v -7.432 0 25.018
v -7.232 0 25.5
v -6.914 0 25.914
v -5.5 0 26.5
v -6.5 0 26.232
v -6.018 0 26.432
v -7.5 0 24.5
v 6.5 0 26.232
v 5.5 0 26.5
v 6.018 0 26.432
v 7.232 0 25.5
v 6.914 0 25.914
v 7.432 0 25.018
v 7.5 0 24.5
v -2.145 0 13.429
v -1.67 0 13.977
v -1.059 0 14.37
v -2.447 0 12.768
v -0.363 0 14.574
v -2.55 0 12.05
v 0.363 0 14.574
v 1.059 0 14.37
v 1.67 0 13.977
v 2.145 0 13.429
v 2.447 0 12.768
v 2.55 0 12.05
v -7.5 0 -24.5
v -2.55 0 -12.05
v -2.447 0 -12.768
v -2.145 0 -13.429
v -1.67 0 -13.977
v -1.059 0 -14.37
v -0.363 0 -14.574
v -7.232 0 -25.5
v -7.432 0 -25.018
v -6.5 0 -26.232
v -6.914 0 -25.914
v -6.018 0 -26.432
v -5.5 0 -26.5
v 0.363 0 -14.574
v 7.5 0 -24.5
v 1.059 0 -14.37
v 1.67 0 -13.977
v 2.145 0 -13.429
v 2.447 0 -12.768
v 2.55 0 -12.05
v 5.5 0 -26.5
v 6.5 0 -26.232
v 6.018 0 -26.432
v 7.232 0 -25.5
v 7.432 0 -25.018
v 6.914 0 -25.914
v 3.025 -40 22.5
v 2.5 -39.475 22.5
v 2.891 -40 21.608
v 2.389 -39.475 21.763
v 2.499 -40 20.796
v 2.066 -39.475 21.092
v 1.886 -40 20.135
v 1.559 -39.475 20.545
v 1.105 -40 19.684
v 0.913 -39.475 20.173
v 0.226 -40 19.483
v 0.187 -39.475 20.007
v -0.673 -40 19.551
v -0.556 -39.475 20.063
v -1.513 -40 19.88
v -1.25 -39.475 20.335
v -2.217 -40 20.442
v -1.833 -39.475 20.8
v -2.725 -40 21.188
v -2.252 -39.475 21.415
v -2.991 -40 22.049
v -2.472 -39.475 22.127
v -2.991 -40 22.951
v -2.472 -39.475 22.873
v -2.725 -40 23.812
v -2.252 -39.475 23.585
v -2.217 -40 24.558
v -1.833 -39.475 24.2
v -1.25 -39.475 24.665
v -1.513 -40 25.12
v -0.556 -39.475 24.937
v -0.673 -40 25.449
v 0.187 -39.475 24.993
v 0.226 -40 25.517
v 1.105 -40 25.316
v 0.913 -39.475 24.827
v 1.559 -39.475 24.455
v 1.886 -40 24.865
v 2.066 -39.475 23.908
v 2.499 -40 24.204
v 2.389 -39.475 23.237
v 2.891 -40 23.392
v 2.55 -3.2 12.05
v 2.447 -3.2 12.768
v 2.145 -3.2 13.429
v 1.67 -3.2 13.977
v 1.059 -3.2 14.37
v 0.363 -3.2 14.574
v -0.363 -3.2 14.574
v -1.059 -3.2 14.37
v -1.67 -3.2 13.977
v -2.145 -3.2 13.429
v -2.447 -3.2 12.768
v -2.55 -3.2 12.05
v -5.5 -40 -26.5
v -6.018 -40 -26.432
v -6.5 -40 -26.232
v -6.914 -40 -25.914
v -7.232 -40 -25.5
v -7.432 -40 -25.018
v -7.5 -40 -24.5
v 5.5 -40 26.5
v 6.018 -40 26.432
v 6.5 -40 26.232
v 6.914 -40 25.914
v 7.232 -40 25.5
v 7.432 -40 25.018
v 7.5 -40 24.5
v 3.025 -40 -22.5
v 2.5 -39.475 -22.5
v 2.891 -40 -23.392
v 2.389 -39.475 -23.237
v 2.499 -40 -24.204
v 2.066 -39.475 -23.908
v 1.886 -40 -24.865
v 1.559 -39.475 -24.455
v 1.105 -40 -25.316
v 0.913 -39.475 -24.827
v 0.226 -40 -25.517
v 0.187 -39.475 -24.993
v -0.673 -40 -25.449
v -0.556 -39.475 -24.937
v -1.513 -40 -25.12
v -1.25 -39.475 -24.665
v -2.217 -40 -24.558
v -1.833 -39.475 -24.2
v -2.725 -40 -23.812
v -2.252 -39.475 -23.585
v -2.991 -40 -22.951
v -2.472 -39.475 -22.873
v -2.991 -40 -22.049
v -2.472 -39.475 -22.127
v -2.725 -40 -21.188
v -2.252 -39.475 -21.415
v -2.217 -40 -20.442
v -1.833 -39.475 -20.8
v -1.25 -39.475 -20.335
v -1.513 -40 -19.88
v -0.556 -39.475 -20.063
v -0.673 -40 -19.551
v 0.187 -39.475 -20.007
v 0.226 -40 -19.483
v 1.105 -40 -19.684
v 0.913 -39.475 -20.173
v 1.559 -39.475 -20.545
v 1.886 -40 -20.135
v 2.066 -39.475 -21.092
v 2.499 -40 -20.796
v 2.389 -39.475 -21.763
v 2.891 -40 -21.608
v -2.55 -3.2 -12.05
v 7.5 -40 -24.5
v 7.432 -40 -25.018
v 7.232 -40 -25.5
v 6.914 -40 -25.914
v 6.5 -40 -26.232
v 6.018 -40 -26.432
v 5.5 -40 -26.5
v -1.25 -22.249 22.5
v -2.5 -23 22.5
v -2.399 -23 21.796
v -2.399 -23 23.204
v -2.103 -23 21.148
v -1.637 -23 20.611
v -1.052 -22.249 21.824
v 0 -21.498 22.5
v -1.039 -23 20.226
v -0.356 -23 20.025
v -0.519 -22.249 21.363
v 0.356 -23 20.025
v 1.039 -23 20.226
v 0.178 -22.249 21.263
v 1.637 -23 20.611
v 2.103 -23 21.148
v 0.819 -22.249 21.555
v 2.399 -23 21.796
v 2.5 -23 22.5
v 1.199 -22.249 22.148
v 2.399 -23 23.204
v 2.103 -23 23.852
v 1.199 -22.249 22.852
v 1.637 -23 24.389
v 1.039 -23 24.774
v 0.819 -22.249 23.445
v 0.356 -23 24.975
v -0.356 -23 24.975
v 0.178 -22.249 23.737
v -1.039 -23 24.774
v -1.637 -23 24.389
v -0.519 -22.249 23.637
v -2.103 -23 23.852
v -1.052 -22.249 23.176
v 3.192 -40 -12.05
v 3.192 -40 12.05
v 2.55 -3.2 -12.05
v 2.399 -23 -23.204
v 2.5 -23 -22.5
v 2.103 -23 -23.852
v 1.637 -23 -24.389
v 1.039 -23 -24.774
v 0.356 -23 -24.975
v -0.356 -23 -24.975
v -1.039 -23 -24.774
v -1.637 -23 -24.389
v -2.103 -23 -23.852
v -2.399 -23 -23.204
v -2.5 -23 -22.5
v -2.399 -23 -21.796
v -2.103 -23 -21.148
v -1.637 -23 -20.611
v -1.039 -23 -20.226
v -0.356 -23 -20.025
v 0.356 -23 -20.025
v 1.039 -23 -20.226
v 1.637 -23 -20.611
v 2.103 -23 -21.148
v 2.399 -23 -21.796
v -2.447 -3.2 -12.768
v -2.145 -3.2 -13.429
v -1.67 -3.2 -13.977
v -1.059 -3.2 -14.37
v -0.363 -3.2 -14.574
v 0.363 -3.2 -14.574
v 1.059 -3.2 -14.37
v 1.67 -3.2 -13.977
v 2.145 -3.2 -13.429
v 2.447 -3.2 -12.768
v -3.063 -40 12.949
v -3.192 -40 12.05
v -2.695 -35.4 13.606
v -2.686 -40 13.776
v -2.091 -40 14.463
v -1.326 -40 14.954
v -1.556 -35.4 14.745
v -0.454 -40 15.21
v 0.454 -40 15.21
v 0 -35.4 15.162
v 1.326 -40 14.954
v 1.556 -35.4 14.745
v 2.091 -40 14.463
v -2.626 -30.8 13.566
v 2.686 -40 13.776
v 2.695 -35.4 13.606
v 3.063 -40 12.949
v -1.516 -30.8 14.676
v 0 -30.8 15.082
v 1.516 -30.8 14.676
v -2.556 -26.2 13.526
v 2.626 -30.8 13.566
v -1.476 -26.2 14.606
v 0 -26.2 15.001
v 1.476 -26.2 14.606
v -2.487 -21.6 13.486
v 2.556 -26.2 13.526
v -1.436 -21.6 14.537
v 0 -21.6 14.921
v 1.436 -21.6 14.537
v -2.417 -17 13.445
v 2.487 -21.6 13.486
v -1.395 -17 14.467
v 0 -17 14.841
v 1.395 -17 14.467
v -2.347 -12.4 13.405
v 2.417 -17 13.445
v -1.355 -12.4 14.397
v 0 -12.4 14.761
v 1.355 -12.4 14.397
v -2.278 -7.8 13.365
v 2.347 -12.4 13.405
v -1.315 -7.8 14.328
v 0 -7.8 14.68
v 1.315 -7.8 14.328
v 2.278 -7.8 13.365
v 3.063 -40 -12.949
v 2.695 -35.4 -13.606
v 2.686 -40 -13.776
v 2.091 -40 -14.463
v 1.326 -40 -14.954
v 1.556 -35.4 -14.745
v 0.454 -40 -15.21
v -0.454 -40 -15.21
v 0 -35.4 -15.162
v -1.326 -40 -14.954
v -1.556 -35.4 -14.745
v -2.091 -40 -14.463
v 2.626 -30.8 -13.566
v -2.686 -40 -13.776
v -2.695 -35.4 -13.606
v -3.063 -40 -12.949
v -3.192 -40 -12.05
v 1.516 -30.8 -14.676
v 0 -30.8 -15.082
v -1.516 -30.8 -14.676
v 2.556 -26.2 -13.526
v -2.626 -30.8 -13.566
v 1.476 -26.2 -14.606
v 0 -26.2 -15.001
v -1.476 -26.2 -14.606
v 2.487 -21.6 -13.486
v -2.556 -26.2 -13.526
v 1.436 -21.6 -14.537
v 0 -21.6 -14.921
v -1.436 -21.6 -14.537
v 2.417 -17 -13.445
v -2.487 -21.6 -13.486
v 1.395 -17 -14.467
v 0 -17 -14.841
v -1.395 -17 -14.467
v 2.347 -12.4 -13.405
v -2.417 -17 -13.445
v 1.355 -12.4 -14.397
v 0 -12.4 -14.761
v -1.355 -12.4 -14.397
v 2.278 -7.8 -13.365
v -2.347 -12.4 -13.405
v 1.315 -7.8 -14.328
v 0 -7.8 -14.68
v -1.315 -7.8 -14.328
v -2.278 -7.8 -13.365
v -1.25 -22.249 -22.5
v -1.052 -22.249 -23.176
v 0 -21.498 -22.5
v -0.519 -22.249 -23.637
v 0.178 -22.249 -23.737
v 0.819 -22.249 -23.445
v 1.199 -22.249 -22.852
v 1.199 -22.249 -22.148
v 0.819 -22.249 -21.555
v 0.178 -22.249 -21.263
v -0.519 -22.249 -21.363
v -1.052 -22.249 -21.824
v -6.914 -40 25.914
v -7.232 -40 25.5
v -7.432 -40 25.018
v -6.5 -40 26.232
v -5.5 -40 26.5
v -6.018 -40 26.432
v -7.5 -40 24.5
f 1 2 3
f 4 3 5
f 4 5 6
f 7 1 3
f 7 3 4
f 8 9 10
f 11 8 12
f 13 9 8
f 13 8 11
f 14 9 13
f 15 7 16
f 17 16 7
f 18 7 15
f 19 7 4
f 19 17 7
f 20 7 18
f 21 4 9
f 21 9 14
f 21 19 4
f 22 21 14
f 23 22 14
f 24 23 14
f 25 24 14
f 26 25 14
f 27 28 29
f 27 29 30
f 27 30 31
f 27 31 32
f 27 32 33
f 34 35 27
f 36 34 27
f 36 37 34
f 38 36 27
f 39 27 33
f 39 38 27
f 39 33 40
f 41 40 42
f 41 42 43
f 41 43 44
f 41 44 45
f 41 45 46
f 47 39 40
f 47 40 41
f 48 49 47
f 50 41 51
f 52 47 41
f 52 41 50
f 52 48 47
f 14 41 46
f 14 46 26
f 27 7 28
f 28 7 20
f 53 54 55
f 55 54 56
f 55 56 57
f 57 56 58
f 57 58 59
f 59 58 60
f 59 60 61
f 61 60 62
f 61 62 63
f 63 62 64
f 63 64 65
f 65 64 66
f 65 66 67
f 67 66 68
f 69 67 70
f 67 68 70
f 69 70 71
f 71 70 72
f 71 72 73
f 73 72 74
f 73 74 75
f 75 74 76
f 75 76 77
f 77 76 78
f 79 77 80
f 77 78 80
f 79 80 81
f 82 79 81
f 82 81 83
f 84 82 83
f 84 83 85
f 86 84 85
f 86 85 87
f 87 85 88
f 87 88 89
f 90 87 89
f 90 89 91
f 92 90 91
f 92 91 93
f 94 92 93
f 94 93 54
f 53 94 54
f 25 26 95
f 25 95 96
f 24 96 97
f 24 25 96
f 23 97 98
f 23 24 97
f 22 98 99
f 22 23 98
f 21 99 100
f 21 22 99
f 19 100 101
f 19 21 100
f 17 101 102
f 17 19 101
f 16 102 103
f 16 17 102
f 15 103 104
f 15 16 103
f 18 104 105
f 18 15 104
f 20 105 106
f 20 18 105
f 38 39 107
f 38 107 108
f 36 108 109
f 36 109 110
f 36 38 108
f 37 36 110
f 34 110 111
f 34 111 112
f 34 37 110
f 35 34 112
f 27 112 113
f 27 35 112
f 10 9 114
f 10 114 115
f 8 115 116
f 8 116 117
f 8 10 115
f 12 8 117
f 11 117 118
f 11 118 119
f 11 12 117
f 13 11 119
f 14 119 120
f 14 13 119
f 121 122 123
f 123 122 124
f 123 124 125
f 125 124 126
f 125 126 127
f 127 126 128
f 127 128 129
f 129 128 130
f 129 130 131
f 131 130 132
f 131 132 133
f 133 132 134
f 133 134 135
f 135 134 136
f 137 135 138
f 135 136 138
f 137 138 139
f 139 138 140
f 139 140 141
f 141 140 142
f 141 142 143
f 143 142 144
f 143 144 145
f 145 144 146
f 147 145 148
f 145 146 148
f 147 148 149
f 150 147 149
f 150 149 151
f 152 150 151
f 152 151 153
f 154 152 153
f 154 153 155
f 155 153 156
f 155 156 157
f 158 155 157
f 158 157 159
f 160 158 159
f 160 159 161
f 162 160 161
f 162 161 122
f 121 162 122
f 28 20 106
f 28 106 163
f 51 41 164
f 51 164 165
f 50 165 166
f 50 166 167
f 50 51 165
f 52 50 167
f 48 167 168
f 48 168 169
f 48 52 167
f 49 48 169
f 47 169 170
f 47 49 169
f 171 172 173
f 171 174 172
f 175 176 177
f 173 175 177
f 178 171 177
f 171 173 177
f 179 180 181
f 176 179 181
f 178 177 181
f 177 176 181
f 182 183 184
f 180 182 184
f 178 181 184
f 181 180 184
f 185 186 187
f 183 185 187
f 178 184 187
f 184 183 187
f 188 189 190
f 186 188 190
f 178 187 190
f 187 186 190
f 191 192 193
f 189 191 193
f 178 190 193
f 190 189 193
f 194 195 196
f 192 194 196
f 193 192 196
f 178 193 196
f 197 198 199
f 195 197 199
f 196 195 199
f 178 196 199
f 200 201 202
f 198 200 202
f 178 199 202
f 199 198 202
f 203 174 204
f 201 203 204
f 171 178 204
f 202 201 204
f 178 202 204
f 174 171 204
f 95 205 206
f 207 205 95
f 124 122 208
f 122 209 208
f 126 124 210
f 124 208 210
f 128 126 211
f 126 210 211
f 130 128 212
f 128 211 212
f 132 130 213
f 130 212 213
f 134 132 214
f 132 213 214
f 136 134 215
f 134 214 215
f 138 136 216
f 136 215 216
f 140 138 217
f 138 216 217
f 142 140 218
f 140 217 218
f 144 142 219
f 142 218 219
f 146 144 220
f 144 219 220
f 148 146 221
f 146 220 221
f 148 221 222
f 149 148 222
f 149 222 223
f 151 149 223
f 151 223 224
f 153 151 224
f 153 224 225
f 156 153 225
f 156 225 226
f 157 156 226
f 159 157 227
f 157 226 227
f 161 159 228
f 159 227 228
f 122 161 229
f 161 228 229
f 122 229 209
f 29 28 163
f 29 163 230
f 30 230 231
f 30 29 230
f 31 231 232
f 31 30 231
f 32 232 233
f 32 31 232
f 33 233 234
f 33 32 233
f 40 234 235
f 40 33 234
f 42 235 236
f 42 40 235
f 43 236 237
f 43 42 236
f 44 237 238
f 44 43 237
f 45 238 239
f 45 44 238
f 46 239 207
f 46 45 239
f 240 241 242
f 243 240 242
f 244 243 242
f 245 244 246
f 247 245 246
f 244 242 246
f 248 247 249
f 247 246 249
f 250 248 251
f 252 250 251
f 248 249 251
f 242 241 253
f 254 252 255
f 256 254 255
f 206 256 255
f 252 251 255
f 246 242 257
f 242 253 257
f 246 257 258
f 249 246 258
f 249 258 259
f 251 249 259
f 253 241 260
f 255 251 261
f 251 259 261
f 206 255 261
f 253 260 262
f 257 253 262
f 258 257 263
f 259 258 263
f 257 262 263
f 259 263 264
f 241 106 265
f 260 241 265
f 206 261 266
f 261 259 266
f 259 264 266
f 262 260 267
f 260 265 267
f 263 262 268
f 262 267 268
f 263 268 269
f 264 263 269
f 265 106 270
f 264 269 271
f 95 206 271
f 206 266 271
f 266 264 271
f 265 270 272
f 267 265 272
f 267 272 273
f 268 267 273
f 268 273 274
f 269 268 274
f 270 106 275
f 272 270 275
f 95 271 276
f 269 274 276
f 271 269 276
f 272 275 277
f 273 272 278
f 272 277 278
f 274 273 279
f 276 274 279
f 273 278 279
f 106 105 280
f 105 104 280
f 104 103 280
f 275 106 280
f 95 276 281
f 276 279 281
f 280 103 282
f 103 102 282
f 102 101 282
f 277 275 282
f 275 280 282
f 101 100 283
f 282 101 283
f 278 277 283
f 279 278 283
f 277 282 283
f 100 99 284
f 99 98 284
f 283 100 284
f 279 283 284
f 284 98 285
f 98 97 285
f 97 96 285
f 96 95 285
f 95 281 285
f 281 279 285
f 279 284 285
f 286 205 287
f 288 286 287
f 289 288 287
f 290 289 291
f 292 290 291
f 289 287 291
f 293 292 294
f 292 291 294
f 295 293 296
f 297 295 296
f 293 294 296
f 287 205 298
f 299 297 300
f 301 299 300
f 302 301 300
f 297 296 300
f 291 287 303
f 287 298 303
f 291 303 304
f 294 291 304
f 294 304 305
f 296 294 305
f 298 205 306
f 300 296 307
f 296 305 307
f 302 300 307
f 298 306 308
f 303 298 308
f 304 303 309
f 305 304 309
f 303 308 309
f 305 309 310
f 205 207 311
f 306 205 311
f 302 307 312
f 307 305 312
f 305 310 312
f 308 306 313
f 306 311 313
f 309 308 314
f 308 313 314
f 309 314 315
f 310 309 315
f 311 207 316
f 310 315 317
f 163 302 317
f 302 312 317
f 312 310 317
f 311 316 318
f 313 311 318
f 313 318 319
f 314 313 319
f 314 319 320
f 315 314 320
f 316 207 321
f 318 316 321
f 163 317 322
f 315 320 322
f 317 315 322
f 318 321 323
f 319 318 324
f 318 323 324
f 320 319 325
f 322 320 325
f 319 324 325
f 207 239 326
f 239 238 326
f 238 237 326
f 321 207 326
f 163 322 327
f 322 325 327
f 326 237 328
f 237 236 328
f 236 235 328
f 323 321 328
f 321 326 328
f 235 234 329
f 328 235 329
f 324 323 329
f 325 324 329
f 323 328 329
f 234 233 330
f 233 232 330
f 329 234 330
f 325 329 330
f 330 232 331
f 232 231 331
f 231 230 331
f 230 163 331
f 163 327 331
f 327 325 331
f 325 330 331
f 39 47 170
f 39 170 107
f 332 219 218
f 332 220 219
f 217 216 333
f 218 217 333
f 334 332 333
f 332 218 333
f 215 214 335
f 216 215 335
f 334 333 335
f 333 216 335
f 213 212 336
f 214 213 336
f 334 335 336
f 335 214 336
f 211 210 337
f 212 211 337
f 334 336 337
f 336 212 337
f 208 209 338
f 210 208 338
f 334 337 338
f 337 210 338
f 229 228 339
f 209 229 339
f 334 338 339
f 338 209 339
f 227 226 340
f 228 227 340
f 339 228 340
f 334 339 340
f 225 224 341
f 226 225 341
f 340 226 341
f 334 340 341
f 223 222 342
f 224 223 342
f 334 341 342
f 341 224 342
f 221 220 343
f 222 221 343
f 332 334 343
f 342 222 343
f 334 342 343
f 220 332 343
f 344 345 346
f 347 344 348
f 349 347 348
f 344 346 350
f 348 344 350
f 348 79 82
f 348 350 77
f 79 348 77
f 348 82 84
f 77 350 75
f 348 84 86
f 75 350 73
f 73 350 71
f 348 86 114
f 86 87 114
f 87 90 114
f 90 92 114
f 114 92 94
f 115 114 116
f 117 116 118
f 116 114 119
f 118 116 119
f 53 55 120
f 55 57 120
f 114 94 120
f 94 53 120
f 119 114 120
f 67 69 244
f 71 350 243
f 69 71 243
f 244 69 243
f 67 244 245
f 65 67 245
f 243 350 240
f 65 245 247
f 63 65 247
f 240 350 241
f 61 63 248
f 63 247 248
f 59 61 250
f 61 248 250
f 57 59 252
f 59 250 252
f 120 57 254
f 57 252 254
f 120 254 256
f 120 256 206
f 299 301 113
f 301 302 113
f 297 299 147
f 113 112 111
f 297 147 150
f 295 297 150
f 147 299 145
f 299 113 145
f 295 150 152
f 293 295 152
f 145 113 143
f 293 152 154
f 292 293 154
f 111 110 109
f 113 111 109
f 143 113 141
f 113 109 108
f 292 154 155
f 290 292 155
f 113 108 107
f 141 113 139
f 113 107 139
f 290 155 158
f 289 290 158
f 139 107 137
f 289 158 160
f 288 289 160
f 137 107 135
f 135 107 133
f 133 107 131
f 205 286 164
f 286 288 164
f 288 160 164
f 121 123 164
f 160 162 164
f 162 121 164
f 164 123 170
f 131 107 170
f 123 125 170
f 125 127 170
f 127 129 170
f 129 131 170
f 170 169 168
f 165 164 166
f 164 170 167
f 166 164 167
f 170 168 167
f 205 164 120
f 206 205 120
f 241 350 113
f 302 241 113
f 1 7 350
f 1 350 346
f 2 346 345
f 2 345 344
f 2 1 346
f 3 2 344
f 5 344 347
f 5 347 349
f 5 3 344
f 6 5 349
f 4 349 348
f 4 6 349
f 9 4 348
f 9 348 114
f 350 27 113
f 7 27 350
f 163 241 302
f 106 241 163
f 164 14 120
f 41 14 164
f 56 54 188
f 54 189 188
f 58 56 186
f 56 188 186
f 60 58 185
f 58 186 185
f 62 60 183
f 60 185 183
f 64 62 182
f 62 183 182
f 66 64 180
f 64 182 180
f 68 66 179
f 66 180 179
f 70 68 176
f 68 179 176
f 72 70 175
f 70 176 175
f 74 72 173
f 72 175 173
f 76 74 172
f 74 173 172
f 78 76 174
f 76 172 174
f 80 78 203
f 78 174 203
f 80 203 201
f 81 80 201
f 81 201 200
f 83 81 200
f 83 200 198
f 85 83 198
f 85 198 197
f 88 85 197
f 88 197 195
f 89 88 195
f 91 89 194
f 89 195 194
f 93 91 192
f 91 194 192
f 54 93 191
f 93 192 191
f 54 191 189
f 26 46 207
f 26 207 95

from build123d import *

# Parameters (mm, degrees)
BOSS_EXTRUDE1_DEPTH         = 40
CUT_EXTRUDE2_REACH          = 50.564
M6_TAPPED_HOLE1_D           = 5
M6_TAPPED_HOLE1_DEPTH       = 17
M6_TAPPED_HOLE1_CSINK_D     = 6.05
M6_TAPPED_HOLE1_CSINK_ANGLE = 90
M6_TAPPED_HOLE1_TIP         = 1.502151548


with BuildPart() as part:
    # Sketch1 → Boss-Extrude1 (new body)
    with BuildSketch(Plane(origin=(0, 0, 0), x_dir=(1, 0, 0), z_dir=(0, 1, 0))):
        with BuildLine():
            Line((-5.5, -26.5), (5.5, -26.5))
            ThreePointArc((5.5, -26.5), (6.914213562, -25.914213562), (7.5, -24.5))
            Line((7.5, -24.5), (7.5, 24.5))
            ThreePointArc((7.5, 24.5), (6.914213562, 25.914213562), (5.5, 26.5))
            Line((5.5, 26.5), (-5.5, 26.5))
            ThreePointArc((-5.5, 26.5), (-6.914213562, 25.914213562), (-7.5, 24.5))
            Line((-7.5, 24.5), (-7.5, -24.5))
            ThreePointArc((-7.5, -24.5), (-6.914213562, -25.914213562), (-5.5, -26.5))
        make_face()
    extrude(amount=-BOSS_EXTRUDE1_DEPTH)

    # Sketch5 → Cut-Extrude2 (cut, up to next)
    with BuildSketch(Plane(origin=(0, 0, 0), x_dir=(1, 0, 0), z_dir=(0, 1, 0)), mode=Mode.PRIVATE) as cut_extrude2_sk1:
        with BuildLine():
            Line((-2.55, -12.05), (-2.55, 12.05))
            ThreePointArc((-2.55, 12.05), (0, 14.6), (2.55, 12.05))
            Line((2.55, 12.05), (2.55, -12.05))
            ThreePointArc((2.55, -12.05), (0, -14.6), (-2.55, -12.05))
        make_face()
    cut_extrude2_tool1 = extrude(cut_extrude2_sk1.sketch, amount=-CUT_EXTRUDE2_REACH, mode=Mode.PRIVATE) & part.part
    add(cut_extrude2_tool1.solids().sort_by_distance((0, 0, 0))[0], mode=Mode.SUBTRACT)

    # Cut-Sweep1: sweep along a path in Sketch8
    with BuildLine(Plane(origin=(0, 0, 0), x_dir=(1, 0, 0), z_dir=(0, 1, 0))) as cut_sweep1_path:
        Line((-2.55, 12.05), (-2.55, -12.05))
        ThreePointArc((-2.55, -12.05), (0, -14.6), (2.55, -12.05))
        Line((2.55, -12.05), (2.55, 12.05))
        ThreePointArc((2.55, 12.05), (0, 14.6), (-2.55, 12.05))
    # Sketch7 → Cut-Sweep1 (sweep, cut)
    with BuildSketch(Plane.XY):
        Polygon((2.55, -3.2), (3.192346389, -40), (2.55, -40), align=None)
    sweep(path=cut_sweep1_path.line, mode=Mode.SUBTRACT)

    # M6 Tapped Hole1
    with Locations(Plane(origin=(0, -40, 0), x_dir=(-1, 0, 0), z_dir=(0, -1, 0))):
        with Locations((0, 22.5), (0, -22.5)):
            CounterSinkHole(M6_TAPPED_HOLE1_D / 2, M6_TAPPED_HOLE1_CSINK_D / 2, depth=M6_TAPPED_HOLE1_DEPTH, counter_sink_angle=M6_TAPPED_HOLE1_CSINK_ANGLE)
            with Locations((0, 0, -(M6_TAPPED_HOLE1_DEPTH + M6_TAPPED_HOLE1_TIP / 2))):  # 118° drill point
                Cone(0, M6_TAPPED_HOLE1_D / 2, M6_TAPPED_HOLE1_TIP, mode=Mode.SUBTRACT)


solid = part.part
